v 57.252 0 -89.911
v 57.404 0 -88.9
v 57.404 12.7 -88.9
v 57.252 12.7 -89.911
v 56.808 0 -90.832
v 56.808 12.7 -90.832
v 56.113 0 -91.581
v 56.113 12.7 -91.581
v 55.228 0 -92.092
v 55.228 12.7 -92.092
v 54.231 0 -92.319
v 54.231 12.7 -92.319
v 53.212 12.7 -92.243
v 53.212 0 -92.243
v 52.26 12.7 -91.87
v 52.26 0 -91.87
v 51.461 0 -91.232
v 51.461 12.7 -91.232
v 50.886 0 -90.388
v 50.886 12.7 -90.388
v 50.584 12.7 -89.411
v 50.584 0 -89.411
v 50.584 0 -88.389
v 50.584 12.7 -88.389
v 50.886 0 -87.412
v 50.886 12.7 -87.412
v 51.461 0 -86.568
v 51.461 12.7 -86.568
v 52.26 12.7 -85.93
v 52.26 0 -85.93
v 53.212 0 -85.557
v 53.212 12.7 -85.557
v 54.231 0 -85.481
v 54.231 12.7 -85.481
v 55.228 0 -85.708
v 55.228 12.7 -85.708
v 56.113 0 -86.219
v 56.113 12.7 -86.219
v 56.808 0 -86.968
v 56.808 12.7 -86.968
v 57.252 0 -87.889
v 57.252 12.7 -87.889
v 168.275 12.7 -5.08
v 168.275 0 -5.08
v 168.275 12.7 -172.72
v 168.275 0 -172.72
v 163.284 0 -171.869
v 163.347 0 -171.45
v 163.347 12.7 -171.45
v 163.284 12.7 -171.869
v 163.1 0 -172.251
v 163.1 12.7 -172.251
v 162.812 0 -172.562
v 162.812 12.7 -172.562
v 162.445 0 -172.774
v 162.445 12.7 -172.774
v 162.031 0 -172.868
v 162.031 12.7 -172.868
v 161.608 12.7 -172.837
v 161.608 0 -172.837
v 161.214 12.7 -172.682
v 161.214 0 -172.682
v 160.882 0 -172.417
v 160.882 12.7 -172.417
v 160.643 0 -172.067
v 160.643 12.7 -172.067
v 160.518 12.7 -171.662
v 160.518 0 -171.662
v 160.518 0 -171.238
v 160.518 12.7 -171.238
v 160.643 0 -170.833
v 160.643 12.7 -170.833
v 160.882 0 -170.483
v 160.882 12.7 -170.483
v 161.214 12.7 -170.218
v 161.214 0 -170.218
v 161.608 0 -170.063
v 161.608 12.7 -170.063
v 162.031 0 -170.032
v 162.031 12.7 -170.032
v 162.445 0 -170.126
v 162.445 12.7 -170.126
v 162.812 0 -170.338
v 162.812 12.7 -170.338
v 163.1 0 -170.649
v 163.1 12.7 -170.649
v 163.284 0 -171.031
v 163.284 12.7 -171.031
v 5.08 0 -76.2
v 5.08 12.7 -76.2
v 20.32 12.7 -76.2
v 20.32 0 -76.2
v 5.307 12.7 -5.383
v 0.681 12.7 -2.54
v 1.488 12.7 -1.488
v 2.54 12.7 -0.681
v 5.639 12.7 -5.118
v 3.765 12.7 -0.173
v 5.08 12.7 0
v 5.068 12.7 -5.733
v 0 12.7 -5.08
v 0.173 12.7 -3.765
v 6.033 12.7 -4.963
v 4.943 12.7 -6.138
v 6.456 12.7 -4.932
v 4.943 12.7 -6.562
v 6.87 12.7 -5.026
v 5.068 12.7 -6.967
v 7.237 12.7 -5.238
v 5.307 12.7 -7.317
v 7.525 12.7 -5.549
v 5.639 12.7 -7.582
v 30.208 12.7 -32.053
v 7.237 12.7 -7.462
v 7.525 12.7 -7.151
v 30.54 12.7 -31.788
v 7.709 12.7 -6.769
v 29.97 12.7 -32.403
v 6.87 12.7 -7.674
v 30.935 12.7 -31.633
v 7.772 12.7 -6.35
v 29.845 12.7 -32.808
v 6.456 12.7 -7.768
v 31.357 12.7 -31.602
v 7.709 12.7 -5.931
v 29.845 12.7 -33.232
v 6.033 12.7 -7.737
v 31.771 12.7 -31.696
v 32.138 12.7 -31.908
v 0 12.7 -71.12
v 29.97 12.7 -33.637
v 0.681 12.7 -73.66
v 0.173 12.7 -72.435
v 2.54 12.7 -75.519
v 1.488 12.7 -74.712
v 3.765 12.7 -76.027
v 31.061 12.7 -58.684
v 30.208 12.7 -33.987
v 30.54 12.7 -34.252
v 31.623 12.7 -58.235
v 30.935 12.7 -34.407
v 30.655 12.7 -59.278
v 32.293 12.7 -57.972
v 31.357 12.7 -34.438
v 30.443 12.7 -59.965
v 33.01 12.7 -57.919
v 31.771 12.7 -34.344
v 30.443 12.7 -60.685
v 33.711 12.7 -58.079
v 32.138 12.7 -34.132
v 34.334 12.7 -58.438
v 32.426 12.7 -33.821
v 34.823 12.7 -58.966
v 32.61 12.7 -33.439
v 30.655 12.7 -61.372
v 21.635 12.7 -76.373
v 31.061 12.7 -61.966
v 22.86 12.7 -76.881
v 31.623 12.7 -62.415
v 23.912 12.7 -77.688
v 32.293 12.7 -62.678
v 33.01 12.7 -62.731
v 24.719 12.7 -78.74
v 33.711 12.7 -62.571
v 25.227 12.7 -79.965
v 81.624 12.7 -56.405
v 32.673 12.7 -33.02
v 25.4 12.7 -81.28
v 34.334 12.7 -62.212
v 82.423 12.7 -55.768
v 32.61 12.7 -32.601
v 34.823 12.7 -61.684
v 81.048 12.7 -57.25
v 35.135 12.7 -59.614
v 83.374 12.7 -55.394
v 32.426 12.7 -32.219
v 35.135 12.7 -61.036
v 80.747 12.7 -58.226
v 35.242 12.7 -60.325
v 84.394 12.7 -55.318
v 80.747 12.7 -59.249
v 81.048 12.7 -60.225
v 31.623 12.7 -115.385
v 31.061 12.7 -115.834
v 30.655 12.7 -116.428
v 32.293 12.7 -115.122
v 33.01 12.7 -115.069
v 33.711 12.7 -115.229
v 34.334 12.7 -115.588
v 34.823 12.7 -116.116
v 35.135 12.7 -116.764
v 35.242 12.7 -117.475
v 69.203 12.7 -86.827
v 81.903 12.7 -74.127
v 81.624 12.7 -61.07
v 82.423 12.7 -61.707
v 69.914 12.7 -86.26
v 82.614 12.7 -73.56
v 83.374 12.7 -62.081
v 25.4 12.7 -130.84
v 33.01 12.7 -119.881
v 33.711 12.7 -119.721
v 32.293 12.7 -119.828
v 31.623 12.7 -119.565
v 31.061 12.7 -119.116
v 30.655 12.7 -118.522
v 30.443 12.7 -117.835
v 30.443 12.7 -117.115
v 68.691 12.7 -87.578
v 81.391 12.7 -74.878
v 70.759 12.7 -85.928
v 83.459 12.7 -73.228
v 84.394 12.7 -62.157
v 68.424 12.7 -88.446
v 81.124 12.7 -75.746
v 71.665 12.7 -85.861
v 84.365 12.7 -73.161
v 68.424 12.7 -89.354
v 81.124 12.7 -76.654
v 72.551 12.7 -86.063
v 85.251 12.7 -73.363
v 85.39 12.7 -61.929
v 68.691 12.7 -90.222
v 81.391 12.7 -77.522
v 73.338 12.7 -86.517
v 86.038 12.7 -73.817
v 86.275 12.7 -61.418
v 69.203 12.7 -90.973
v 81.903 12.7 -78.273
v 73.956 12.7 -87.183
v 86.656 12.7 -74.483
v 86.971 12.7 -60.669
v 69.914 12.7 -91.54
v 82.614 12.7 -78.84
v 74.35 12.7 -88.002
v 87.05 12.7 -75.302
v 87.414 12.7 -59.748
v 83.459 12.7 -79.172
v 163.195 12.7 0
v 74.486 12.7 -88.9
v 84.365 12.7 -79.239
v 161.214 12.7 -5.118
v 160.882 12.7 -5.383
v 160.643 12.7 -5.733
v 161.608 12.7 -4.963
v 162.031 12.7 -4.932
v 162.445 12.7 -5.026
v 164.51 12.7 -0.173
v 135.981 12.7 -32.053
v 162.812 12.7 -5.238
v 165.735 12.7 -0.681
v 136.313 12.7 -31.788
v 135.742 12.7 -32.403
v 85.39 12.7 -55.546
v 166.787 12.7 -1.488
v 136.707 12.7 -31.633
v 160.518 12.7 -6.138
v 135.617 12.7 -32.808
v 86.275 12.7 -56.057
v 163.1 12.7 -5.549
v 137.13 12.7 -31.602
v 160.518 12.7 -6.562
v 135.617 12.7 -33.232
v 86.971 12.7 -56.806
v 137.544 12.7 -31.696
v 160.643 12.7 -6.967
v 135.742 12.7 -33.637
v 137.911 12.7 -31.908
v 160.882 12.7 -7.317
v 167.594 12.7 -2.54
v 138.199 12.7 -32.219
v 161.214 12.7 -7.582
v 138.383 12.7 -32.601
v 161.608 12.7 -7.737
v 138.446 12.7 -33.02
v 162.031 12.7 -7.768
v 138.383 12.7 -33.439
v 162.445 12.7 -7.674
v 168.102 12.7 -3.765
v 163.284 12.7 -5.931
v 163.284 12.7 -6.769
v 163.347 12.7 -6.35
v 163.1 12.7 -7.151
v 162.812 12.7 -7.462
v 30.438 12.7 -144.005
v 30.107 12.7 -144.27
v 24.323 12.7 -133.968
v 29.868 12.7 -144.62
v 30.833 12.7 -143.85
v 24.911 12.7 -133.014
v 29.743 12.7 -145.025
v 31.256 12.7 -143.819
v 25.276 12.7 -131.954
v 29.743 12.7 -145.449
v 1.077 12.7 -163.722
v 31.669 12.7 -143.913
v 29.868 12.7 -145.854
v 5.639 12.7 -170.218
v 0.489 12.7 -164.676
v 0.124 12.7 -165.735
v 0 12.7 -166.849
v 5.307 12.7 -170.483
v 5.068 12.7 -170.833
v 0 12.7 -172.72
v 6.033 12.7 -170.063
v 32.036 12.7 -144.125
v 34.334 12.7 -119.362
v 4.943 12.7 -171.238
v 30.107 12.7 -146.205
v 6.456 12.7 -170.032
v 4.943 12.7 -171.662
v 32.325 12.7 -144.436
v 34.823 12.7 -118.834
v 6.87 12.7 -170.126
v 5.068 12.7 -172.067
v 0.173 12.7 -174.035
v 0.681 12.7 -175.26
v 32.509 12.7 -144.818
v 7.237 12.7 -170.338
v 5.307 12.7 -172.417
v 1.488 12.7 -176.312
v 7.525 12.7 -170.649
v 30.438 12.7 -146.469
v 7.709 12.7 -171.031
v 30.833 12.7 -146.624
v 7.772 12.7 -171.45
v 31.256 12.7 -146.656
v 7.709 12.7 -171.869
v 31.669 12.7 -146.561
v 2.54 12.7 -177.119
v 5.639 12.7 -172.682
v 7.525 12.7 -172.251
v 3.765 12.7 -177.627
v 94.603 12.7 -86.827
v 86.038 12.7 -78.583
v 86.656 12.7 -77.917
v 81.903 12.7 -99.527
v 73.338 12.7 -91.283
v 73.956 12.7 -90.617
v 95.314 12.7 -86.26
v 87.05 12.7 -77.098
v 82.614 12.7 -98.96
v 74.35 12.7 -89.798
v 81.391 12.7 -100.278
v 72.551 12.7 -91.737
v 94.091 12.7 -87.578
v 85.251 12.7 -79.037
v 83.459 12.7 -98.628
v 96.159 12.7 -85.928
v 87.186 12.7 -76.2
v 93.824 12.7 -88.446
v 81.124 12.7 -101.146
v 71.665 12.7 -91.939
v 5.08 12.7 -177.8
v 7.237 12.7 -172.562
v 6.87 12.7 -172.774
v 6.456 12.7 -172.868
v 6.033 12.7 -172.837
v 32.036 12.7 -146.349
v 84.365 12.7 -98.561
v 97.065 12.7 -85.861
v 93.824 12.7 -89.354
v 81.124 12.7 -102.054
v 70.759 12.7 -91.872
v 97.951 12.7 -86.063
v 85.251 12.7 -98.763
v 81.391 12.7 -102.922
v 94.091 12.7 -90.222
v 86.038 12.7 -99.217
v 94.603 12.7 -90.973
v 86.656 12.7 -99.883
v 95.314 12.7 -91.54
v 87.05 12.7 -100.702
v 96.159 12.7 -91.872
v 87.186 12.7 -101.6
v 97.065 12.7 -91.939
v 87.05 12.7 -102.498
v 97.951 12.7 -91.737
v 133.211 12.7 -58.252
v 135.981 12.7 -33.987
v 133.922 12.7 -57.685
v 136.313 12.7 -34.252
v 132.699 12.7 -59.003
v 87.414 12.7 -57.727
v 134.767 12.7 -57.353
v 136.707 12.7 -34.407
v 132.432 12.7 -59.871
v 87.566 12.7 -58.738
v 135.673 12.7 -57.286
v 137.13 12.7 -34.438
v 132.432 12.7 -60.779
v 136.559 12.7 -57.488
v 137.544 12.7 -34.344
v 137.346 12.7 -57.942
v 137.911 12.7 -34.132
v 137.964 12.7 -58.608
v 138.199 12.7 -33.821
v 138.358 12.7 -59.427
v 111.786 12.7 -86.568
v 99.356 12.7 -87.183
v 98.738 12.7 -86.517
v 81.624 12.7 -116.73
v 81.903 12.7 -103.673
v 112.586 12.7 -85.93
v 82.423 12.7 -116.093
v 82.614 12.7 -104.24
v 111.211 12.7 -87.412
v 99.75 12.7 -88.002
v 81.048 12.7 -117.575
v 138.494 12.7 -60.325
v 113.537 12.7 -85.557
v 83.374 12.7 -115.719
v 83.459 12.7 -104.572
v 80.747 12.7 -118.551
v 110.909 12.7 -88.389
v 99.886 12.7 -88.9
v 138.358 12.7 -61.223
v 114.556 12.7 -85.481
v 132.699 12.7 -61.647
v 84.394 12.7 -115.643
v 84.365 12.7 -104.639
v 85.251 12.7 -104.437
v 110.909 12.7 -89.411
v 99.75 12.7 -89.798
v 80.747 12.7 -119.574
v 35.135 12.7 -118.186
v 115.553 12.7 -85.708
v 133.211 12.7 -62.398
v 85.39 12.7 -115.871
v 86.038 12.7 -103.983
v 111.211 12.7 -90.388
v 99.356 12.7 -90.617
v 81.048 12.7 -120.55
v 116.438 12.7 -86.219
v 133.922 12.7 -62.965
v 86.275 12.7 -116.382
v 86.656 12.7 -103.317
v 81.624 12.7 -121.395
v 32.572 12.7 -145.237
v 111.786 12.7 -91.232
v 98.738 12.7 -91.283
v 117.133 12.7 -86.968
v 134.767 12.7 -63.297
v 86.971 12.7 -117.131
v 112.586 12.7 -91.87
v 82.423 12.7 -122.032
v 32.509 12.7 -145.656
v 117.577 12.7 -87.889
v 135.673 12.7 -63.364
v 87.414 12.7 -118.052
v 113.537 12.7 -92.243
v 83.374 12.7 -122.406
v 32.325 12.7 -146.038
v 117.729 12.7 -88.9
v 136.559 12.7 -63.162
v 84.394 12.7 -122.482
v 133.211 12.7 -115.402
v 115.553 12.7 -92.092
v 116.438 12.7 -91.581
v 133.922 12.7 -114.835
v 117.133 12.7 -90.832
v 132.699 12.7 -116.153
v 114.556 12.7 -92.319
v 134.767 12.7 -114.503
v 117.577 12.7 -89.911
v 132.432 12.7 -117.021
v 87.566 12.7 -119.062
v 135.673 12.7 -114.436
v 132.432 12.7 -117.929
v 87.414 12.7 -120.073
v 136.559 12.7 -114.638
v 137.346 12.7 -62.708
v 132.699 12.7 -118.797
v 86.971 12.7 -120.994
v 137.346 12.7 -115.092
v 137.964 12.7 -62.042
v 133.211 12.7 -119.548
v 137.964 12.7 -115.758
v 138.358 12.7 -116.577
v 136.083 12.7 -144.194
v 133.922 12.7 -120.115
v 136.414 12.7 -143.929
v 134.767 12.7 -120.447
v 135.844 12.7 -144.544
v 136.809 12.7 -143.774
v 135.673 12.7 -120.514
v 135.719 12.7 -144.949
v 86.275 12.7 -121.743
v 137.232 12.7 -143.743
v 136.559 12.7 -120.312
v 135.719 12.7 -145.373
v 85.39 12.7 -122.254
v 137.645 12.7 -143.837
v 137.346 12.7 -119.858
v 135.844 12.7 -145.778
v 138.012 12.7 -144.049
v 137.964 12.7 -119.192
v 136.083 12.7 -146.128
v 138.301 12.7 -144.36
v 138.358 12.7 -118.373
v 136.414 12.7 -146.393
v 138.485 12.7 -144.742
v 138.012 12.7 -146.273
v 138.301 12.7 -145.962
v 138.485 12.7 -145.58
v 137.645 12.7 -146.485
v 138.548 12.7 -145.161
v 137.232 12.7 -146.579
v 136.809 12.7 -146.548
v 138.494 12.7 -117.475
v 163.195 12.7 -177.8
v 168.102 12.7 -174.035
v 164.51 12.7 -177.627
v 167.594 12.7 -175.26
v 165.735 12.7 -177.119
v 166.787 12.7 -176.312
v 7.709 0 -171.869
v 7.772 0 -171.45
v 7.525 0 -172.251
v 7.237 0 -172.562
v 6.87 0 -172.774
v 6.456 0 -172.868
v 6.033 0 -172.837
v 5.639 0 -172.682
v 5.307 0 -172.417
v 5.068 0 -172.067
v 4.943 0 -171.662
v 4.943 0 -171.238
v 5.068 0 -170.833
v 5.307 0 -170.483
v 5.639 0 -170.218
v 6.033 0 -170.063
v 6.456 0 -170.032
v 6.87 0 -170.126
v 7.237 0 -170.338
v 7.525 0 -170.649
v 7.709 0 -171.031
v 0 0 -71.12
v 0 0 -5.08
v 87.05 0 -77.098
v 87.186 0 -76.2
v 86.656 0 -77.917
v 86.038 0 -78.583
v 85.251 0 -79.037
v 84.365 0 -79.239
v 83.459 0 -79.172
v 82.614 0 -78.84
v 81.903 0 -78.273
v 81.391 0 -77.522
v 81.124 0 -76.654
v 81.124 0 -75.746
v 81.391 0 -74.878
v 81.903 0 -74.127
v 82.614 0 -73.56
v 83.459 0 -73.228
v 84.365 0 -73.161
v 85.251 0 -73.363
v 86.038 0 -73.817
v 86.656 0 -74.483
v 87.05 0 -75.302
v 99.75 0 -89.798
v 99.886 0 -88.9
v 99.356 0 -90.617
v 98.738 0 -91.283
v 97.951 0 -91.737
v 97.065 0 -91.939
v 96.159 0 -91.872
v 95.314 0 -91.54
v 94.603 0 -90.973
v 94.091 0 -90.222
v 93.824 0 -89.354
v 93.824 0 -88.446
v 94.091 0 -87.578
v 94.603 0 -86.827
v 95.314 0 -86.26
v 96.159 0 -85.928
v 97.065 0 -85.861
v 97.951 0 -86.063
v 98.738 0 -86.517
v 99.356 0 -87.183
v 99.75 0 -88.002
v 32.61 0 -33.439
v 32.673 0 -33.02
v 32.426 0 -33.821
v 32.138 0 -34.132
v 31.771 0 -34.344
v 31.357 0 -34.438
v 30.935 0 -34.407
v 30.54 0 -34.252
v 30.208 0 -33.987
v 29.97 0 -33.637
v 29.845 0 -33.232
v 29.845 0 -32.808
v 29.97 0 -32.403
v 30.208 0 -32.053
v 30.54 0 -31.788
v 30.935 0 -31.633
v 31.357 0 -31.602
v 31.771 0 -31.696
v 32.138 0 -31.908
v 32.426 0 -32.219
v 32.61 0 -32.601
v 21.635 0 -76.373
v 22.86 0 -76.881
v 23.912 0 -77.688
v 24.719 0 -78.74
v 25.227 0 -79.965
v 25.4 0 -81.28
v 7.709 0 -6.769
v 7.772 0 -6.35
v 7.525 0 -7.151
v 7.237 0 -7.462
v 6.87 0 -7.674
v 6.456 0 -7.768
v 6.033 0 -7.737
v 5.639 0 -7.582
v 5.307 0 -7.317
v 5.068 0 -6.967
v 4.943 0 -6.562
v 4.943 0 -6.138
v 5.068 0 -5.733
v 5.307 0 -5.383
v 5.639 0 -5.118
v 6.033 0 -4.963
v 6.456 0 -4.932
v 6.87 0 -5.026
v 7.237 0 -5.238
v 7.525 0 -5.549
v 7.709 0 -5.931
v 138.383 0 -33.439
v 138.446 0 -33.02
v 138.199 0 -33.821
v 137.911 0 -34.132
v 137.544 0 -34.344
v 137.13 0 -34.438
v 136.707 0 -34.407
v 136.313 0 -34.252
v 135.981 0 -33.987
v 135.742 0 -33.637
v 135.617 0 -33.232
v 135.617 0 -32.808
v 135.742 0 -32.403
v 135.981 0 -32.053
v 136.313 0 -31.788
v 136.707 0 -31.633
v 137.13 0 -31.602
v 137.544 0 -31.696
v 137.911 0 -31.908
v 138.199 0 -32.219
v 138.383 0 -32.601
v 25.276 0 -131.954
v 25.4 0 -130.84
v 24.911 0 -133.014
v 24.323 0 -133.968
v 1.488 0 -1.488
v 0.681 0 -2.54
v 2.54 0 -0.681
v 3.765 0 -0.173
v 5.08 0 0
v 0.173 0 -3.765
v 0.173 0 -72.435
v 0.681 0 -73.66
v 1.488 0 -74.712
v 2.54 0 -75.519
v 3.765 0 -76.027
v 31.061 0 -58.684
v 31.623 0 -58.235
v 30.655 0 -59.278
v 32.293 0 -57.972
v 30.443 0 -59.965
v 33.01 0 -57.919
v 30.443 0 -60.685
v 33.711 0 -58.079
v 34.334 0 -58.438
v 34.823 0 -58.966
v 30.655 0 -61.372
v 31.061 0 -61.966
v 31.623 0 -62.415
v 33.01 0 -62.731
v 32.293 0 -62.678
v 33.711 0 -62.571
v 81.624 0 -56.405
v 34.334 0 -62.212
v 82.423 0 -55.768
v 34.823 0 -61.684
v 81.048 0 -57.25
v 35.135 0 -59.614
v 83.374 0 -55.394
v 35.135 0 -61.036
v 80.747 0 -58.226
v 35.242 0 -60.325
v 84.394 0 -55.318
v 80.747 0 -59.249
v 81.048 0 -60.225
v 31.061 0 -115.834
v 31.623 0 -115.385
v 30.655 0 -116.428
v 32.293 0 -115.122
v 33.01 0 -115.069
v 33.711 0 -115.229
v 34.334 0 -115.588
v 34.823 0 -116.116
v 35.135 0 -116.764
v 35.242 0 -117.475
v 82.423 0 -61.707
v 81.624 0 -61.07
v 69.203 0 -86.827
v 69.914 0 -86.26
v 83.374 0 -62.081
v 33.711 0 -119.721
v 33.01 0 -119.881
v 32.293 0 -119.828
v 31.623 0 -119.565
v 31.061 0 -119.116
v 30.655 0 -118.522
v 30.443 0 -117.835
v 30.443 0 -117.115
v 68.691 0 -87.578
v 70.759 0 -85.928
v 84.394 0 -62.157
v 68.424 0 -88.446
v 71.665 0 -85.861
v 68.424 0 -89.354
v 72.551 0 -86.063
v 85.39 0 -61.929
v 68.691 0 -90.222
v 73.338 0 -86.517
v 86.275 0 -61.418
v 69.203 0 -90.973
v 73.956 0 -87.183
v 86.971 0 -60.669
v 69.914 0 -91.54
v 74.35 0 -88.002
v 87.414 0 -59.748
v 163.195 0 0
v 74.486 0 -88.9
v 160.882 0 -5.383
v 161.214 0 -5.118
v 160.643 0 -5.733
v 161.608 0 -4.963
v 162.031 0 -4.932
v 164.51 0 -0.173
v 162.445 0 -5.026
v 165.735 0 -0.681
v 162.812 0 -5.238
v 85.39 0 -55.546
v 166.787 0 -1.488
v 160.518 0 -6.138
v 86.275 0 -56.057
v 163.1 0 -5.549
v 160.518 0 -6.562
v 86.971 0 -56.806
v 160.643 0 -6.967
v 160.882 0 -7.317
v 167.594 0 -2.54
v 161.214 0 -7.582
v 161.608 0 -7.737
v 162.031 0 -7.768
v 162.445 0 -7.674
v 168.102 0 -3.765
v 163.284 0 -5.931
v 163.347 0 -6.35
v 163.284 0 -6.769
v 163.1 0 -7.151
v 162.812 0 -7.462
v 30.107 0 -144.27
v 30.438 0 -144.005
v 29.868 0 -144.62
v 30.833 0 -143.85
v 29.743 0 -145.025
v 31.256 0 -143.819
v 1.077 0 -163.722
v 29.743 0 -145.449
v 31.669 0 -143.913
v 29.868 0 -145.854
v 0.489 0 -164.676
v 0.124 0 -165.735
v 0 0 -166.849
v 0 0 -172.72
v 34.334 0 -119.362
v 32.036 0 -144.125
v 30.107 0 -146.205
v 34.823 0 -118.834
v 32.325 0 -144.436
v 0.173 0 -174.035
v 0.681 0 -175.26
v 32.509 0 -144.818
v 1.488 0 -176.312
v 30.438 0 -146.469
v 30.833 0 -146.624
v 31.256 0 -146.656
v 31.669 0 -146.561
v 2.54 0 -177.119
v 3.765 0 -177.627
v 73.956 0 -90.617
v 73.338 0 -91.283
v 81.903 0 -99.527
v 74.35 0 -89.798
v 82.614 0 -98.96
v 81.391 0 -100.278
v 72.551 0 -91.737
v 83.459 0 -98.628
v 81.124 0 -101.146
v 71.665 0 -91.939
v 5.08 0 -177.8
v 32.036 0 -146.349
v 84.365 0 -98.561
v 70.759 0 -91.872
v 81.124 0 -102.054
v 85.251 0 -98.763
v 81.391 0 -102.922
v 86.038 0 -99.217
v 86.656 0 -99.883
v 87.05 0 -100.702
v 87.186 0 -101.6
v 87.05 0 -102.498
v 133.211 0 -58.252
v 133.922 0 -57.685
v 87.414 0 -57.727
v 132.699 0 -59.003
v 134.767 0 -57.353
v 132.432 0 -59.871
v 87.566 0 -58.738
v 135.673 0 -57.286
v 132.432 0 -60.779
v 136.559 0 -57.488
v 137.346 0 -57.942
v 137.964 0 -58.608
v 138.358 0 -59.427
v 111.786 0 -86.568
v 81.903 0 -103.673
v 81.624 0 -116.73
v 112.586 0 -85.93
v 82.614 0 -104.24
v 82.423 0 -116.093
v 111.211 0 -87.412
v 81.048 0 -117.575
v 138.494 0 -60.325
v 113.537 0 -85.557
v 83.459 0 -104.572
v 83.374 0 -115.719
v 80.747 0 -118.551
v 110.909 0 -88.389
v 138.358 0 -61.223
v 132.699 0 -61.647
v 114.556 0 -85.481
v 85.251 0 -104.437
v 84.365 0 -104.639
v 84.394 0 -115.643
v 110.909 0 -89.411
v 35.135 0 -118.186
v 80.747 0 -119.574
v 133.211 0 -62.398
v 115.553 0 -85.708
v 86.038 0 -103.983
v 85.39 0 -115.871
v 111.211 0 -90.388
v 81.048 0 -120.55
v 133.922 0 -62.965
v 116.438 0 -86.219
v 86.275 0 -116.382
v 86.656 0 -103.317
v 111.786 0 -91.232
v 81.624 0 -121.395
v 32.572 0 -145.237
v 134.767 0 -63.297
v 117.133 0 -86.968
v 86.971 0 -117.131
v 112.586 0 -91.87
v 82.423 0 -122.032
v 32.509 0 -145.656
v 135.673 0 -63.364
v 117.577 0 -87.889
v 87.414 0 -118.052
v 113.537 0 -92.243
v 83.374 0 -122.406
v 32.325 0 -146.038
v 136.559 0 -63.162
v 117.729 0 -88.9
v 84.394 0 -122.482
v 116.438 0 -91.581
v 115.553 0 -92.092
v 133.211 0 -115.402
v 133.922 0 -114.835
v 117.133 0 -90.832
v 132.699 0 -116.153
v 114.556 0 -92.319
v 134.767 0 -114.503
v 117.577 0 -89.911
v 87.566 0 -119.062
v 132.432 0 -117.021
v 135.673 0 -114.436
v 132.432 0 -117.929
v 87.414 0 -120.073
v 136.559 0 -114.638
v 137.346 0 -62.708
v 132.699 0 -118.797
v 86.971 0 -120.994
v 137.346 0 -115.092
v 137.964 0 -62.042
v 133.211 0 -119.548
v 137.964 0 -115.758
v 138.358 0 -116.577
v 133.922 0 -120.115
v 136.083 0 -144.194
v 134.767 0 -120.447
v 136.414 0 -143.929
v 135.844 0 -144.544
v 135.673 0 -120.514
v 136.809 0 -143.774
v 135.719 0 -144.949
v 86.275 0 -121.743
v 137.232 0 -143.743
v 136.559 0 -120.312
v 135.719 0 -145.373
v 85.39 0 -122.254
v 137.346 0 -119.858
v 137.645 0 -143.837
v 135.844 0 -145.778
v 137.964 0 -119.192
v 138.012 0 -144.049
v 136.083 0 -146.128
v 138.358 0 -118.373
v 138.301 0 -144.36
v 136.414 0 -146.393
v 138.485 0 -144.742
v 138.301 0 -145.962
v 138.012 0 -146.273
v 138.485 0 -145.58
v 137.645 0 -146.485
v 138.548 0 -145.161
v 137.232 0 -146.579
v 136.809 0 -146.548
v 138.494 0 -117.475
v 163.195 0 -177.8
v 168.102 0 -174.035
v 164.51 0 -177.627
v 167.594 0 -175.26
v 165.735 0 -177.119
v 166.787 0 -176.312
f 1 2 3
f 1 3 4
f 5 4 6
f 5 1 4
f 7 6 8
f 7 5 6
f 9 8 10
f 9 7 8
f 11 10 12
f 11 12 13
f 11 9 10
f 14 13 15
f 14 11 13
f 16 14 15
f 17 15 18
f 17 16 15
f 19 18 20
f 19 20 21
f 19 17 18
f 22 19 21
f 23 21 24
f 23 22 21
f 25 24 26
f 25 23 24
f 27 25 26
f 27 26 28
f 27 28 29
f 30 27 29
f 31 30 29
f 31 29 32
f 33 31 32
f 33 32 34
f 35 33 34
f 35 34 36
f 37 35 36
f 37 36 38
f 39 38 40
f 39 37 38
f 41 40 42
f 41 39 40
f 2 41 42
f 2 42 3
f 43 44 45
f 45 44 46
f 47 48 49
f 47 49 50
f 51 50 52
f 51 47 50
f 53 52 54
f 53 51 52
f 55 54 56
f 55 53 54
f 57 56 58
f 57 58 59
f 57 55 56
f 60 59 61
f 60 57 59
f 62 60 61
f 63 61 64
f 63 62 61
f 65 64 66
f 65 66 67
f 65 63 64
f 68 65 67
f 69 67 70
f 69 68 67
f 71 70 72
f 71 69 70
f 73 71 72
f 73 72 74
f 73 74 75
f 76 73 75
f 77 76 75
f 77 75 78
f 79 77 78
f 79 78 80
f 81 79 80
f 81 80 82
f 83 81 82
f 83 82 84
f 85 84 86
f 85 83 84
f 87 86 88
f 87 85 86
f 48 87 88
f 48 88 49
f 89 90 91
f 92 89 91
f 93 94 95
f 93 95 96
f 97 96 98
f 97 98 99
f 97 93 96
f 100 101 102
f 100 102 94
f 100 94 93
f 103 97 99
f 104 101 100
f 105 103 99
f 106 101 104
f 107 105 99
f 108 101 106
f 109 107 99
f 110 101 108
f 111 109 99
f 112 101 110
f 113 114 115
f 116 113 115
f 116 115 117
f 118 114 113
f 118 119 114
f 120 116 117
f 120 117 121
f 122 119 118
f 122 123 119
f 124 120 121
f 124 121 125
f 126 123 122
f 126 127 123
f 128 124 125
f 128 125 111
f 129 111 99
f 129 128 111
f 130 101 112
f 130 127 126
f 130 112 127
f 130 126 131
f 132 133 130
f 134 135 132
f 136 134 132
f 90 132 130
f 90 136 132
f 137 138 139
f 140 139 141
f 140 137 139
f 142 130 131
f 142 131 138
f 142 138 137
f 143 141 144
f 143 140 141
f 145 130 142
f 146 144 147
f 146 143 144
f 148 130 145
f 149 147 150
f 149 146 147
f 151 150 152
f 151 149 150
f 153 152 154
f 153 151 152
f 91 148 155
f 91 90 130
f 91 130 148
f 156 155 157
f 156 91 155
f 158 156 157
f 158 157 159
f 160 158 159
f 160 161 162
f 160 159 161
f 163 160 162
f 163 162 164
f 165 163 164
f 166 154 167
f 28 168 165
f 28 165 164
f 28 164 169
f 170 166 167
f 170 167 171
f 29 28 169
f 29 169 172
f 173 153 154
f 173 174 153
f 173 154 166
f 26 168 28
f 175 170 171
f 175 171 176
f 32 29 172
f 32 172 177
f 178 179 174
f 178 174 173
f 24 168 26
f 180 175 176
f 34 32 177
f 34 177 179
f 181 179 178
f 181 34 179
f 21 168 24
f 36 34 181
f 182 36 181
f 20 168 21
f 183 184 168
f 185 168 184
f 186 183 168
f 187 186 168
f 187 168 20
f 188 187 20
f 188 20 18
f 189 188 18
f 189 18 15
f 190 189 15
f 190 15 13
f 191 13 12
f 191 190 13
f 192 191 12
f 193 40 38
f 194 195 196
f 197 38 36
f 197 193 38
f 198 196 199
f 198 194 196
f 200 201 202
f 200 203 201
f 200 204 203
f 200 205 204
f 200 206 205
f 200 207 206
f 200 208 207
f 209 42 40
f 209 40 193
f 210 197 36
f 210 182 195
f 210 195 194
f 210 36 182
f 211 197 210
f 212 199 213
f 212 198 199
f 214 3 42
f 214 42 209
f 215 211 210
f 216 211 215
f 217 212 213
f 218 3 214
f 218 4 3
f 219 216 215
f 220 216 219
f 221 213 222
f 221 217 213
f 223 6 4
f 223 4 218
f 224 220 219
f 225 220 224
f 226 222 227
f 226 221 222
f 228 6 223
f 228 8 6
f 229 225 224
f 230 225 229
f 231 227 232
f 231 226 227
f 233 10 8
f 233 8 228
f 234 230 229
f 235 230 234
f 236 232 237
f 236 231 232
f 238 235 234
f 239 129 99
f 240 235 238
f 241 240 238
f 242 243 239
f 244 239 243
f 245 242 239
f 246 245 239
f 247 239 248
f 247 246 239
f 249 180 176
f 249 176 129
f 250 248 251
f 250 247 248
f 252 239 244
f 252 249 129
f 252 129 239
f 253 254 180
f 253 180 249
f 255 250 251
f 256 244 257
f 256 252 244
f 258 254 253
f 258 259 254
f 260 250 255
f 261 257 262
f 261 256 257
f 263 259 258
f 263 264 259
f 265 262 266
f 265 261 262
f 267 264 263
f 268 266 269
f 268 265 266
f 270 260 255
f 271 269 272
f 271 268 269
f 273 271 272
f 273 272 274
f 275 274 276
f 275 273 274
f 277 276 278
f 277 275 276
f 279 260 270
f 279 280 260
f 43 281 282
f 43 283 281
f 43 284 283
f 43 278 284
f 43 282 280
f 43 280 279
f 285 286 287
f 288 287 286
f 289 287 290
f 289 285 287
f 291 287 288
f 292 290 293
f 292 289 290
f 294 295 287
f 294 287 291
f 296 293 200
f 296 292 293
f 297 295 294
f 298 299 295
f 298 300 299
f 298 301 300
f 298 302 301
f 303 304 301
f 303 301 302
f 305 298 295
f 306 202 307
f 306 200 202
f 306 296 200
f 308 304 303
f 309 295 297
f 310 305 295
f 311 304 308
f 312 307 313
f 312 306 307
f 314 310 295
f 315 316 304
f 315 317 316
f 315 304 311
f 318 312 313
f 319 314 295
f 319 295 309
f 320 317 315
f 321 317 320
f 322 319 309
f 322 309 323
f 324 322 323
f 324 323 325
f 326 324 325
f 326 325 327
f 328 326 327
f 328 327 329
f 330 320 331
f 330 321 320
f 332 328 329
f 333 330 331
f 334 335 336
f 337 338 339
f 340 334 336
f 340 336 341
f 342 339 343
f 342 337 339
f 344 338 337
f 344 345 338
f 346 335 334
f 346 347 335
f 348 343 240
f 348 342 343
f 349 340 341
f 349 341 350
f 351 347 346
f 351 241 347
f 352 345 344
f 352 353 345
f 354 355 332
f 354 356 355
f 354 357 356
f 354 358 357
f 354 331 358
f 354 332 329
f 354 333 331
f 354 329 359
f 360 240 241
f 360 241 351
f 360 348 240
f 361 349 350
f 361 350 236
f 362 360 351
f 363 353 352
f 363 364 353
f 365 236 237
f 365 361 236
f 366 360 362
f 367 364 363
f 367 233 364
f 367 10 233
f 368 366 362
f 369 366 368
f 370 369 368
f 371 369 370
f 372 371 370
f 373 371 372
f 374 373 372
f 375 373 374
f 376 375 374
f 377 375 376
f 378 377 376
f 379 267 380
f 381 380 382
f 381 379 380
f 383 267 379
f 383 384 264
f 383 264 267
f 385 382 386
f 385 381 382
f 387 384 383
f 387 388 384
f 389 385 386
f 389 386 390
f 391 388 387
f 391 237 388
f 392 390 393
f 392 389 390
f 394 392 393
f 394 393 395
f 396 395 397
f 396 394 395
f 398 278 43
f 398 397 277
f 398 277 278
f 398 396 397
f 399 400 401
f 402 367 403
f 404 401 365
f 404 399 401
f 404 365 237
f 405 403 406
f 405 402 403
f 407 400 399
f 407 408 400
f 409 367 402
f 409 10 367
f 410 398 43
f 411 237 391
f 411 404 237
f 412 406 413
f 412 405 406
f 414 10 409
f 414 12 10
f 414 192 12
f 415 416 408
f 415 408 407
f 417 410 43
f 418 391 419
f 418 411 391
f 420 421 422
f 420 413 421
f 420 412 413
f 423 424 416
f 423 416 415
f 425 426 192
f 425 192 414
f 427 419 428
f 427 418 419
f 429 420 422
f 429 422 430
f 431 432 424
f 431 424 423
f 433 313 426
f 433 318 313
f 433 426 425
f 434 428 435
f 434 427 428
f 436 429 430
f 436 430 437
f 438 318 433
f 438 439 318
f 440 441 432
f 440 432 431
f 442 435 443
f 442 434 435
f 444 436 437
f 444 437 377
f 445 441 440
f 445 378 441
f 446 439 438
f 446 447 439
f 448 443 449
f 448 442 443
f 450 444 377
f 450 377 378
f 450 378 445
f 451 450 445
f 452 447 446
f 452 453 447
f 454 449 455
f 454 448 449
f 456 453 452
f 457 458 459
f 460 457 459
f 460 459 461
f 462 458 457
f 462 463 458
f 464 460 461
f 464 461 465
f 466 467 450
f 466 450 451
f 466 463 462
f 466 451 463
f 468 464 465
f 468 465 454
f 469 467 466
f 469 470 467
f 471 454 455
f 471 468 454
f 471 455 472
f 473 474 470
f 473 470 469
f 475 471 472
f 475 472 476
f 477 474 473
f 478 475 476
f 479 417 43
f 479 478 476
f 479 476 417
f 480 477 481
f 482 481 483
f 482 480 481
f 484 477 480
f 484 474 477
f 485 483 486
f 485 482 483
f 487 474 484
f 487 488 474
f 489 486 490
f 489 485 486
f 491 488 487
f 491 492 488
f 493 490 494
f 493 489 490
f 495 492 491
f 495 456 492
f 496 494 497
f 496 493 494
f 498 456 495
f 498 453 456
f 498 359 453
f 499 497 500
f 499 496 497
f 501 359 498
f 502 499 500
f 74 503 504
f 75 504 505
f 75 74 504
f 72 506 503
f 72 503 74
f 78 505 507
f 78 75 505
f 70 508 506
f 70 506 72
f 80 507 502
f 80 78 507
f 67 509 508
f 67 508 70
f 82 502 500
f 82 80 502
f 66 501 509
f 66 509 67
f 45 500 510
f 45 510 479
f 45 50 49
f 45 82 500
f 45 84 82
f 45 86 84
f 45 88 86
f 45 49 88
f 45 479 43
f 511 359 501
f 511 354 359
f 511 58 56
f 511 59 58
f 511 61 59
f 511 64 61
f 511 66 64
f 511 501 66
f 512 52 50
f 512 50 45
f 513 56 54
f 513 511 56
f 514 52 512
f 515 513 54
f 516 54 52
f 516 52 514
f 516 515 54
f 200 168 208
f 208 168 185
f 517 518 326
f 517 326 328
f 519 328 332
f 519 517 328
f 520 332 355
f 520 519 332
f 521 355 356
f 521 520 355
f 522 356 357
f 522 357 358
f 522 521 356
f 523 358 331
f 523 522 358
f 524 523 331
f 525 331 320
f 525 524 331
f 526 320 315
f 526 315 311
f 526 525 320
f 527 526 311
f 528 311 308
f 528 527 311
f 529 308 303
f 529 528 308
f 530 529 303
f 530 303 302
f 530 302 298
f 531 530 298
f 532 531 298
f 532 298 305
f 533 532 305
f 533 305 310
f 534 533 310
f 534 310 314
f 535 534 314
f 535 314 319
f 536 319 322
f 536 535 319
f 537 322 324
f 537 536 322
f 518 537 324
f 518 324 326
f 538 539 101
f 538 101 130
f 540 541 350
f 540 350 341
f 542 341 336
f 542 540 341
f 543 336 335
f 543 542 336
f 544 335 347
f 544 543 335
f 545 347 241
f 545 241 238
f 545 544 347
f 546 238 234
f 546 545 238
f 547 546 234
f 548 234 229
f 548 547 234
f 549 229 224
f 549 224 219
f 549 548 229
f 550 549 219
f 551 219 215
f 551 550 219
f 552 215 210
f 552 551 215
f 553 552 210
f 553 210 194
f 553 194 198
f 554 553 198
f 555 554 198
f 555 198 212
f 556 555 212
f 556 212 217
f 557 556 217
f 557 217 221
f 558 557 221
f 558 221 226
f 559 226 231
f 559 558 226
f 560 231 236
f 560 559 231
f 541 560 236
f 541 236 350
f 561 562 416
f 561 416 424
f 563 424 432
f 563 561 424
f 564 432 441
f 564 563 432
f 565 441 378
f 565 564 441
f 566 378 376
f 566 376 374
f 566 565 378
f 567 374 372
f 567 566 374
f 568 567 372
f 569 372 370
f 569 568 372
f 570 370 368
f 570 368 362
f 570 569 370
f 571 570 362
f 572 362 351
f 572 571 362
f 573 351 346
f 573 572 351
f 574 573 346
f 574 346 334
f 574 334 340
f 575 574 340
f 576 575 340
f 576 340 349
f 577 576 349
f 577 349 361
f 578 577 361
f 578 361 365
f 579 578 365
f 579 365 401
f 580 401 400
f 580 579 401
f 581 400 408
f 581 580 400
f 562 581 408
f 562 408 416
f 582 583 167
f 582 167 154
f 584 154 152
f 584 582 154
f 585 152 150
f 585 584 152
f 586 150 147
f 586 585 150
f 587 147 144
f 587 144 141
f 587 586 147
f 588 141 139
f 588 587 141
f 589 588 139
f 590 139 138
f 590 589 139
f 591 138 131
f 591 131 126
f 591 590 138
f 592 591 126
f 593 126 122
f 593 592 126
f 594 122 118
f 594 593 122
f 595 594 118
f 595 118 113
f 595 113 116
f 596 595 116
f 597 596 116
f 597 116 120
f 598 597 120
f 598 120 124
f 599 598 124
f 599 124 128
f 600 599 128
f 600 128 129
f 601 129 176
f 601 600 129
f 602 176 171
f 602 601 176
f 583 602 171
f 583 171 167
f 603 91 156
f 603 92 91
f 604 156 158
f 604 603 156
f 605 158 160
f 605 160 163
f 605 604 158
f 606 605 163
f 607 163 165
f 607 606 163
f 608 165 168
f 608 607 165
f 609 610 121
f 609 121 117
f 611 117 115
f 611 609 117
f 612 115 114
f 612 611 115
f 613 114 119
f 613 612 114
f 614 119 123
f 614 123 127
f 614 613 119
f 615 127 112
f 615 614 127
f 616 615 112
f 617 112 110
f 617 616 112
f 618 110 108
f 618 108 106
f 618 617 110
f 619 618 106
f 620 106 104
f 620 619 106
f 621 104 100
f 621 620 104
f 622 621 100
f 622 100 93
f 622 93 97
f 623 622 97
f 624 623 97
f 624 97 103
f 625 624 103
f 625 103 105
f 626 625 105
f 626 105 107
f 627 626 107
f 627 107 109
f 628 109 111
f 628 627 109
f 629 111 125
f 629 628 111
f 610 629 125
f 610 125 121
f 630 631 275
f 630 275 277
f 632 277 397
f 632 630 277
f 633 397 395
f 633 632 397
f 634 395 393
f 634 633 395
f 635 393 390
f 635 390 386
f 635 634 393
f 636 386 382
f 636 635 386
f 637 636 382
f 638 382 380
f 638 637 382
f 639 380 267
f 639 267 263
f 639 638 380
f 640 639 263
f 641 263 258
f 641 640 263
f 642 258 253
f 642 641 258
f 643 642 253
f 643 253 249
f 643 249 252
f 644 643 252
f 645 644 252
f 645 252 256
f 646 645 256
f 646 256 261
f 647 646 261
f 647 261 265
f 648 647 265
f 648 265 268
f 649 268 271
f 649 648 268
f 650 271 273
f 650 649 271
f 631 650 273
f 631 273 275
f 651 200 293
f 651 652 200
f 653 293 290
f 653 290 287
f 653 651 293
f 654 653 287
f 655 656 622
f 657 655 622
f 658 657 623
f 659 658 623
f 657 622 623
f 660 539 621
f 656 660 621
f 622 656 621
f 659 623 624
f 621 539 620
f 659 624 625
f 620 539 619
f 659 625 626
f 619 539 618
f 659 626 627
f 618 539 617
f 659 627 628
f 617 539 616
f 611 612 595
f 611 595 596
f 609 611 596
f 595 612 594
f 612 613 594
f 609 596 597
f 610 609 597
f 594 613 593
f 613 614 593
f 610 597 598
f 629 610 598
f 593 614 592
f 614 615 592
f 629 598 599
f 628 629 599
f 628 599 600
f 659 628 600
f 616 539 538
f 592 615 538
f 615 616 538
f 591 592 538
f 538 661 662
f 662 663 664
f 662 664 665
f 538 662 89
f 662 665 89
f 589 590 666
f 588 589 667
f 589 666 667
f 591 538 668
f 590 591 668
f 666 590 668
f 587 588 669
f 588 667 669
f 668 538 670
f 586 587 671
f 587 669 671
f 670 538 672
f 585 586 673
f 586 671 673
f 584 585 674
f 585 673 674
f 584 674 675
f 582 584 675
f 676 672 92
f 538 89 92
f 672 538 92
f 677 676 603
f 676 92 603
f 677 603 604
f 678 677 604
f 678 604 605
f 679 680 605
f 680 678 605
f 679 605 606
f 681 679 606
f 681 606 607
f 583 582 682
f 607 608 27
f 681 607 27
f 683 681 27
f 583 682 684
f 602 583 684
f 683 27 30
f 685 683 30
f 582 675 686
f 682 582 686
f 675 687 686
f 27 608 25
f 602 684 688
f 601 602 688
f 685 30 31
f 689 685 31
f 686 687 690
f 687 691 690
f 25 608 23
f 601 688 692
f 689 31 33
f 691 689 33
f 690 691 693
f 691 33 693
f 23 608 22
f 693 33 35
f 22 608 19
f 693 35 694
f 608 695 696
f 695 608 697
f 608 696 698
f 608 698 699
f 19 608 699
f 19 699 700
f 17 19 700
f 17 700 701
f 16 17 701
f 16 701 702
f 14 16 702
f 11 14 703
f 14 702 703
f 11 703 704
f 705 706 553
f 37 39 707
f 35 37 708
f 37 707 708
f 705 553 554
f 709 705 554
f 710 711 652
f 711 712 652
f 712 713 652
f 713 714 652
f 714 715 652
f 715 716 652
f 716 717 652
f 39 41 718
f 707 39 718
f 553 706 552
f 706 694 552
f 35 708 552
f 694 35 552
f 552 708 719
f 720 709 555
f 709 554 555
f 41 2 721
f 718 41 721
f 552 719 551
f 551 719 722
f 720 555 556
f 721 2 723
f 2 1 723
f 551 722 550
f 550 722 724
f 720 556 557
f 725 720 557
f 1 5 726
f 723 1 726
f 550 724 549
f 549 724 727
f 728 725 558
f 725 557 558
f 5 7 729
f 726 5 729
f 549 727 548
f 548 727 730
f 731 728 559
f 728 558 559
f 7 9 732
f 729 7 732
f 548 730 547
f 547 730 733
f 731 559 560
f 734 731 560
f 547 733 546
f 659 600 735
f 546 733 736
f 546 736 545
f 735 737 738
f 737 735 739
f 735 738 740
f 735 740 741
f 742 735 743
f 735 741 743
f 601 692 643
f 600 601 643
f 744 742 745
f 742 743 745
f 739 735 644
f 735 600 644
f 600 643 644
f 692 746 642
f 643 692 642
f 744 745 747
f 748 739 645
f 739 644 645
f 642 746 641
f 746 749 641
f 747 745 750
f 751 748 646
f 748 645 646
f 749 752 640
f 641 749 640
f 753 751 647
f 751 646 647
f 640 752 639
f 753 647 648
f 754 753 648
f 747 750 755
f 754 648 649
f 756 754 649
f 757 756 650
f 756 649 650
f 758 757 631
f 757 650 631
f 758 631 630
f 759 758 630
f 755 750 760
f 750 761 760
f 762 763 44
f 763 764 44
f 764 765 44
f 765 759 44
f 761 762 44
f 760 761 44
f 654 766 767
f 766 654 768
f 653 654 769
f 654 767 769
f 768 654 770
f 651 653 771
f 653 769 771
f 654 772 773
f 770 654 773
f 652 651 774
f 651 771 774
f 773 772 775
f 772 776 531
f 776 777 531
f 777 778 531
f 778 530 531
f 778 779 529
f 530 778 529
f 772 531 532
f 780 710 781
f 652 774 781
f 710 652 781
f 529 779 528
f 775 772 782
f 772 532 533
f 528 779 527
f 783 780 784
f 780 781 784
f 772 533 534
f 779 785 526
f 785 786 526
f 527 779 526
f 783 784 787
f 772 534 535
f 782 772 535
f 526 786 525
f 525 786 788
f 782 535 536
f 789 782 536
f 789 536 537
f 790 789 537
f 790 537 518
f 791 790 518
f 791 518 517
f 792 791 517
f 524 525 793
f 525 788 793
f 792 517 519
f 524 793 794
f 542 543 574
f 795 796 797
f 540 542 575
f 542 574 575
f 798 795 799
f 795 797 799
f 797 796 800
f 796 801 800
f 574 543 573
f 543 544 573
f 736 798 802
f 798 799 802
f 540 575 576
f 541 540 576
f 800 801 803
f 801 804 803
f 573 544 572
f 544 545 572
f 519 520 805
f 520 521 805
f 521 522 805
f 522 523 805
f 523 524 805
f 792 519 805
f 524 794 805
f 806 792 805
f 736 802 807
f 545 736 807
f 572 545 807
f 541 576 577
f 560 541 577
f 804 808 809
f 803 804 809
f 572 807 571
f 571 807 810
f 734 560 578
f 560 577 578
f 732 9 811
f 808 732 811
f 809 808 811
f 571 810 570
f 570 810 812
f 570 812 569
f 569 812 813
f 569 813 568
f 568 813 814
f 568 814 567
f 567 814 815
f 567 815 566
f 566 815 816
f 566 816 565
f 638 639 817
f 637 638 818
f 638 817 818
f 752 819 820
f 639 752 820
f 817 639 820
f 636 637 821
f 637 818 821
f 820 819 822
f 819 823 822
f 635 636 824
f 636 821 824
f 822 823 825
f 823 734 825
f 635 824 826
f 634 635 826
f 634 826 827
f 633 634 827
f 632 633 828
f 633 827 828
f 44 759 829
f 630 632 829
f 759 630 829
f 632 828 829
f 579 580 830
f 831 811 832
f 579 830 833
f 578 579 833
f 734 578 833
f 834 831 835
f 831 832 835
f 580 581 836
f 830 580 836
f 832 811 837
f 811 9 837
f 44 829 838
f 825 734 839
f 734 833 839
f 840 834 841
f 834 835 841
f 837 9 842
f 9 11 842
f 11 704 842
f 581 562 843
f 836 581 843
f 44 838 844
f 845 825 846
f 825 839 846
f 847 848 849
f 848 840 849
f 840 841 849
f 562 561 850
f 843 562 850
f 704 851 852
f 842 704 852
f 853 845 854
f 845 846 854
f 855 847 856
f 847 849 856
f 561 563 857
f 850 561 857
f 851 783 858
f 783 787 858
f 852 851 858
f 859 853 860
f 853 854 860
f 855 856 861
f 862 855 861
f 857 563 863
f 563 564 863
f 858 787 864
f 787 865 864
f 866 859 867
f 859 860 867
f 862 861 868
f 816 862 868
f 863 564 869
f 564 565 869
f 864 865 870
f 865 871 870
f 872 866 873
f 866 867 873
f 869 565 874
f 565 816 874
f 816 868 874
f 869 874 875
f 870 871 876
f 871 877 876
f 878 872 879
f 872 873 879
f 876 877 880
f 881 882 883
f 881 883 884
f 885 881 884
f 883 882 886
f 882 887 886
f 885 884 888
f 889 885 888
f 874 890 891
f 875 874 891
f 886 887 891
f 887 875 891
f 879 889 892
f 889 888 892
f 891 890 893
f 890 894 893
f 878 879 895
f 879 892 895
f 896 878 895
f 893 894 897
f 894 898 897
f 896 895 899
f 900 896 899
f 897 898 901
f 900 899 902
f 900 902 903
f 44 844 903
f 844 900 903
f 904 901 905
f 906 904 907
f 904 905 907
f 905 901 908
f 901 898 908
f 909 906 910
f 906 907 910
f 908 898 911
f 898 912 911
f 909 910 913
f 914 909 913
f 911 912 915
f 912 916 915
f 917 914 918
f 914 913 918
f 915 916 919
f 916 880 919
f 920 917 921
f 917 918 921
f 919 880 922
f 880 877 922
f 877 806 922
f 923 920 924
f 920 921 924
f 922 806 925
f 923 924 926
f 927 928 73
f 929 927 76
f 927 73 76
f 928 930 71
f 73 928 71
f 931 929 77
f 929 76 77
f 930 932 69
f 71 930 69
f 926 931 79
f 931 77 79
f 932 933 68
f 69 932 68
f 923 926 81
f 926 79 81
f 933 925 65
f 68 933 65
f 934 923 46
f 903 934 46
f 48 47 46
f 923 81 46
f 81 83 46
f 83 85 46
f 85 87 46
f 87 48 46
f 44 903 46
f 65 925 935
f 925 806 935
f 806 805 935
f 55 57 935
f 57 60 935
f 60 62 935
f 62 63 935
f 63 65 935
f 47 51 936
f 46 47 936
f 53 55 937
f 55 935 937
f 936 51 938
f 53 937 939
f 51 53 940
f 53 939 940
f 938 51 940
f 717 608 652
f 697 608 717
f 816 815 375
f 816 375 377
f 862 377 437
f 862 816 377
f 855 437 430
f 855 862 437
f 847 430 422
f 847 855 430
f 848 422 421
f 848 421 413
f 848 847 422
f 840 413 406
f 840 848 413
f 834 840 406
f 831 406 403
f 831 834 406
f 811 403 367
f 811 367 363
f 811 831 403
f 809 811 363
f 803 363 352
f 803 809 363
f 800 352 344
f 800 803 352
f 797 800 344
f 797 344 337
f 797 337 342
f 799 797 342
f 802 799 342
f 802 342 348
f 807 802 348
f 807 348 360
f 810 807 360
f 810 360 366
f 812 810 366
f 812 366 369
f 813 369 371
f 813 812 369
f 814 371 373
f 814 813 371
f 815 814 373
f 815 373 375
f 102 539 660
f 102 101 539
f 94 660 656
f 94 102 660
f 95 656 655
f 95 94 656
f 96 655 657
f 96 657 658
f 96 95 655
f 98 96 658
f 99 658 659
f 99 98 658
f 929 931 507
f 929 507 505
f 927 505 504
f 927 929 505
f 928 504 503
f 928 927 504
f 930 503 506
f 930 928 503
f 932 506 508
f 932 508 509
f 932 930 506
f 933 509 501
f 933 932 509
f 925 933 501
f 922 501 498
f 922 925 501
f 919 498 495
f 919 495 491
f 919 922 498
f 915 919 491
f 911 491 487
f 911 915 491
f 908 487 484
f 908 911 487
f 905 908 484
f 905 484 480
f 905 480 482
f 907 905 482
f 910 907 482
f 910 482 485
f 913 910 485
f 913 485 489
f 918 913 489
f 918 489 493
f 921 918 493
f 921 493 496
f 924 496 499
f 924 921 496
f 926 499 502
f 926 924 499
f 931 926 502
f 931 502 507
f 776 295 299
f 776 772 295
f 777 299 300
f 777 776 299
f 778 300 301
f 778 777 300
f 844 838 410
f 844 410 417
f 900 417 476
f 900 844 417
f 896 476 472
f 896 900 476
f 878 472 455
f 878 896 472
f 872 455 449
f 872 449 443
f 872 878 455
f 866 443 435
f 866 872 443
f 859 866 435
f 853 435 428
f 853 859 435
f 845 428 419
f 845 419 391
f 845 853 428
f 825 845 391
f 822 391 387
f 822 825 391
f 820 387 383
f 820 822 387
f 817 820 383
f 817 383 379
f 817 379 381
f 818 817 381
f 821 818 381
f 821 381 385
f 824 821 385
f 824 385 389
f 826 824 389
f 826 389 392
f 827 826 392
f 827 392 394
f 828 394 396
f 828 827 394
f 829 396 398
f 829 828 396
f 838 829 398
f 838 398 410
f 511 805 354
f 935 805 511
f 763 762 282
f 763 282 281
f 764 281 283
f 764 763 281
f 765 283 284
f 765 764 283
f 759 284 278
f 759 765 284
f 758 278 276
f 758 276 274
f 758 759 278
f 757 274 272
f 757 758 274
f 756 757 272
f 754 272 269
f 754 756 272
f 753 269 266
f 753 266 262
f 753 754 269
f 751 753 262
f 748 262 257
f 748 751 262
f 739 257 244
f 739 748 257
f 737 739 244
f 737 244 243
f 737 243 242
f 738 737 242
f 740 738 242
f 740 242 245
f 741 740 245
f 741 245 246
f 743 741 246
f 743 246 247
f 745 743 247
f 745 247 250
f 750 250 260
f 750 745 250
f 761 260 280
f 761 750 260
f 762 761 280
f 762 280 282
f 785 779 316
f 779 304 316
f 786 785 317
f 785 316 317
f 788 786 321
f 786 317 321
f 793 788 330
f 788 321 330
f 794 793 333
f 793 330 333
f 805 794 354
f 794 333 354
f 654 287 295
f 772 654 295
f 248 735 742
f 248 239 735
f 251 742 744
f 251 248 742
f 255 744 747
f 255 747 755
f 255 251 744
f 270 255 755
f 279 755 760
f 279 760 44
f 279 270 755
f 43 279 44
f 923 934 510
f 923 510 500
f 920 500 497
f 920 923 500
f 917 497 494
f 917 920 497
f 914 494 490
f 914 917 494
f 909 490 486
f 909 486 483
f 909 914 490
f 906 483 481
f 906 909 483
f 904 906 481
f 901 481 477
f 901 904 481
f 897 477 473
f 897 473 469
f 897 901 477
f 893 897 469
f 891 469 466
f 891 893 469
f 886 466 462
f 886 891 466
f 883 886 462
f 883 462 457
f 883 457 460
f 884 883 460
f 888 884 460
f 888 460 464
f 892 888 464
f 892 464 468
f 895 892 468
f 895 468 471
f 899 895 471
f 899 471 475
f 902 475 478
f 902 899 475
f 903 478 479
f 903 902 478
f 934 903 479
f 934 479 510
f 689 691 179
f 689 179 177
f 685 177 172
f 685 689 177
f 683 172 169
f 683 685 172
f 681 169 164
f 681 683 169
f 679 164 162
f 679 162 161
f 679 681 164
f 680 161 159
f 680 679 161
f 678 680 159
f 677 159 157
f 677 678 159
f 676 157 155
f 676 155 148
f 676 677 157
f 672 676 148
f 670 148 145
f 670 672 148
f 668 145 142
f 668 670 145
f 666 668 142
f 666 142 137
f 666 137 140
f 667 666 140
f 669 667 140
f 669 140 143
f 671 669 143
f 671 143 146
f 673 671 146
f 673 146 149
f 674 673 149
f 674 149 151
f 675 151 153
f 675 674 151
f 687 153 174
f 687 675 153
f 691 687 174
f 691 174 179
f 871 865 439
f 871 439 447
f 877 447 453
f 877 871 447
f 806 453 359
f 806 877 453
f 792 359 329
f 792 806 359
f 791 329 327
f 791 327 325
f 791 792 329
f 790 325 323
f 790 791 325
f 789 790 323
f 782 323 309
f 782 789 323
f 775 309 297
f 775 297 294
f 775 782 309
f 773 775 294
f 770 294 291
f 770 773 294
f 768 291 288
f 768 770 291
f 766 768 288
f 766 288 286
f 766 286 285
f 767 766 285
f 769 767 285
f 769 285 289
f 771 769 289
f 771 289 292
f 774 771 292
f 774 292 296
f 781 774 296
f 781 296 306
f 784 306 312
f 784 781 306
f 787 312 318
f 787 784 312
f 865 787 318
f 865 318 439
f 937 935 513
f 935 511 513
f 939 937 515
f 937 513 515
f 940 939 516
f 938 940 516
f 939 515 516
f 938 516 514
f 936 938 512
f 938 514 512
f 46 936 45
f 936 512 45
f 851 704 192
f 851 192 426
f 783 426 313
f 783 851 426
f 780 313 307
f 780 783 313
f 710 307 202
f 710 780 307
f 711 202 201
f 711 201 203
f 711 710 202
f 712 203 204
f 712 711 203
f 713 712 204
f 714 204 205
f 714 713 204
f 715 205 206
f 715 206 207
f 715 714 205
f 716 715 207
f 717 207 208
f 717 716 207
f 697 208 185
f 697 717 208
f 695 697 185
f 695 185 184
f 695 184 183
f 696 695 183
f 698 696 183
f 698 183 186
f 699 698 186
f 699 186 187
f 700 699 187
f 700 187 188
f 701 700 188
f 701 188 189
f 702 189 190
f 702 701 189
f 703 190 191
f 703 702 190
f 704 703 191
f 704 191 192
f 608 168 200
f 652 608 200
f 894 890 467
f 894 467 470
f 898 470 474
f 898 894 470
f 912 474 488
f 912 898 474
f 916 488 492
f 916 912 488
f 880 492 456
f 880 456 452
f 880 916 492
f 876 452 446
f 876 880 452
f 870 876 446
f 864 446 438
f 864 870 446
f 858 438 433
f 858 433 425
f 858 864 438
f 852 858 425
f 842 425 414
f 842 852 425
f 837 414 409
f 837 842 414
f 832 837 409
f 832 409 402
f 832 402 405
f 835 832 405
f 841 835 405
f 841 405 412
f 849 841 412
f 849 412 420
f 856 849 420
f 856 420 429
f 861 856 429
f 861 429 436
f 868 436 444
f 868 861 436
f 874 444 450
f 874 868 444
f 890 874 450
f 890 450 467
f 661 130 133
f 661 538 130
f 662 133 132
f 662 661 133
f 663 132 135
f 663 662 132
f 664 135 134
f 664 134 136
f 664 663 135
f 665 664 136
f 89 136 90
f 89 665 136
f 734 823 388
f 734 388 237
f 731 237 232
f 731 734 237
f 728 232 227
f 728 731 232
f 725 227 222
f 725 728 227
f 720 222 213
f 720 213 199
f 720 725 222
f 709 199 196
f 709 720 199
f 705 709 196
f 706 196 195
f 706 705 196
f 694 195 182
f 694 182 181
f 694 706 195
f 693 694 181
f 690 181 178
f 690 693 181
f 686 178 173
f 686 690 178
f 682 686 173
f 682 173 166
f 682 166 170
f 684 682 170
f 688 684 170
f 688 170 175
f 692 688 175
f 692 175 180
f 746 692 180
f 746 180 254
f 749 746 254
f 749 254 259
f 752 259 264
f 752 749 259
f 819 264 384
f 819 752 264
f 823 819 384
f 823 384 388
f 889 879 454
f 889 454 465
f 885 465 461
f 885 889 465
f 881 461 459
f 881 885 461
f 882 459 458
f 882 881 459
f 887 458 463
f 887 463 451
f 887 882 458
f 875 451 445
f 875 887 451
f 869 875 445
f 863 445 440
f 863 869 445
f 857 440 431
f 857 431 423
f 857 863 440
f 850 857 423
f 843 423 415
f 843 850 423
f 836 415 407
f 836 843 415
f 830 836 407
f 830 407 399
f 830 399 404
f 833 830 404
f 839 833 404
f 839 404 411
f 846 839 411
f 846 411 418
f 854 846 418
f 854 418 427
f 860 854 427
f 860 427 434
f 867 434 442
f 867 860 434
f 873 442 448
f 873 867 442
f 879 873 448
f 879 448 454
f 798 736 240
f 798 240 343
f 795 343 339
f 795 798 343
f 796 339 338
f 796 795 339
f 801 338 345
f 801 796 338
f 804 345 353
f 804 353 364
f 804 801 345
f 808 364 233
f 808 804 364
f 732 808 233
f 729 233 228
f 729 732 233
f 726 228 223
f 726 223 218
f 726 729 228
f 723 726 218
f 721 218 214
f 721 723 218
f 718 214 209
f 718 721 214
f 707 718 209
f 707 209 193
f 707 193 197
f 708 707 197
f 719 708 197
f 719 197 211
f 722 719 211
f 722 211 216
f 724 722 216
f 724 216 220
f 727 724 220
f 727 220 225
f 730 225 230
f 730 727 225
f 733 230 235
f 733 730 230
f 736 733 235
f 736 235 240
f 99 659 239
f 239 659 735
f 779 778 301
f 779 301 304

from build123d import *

# Parameters (mm, degrees)
SKETCH2_W               = 168.275
SKETCH2_H               = 177.8
SKETCH2_R               = 3.048
SKETCH2_R_2             = 2.413
SKETCH2_R_3             = 1.4224
SKETCH2_R_4             = 3.429
BOSS_EXTRUDE2_DEPTH     = 12.7
CUT_EXTRUDE1_DEPTH      = 1
CUT_EXTRUDE1_DEPTH_BACK = 13.7
FILLET1_R               = 5.08


with BuildPart() as part:
    # Sketch2 → Boss-Extrude2 (new body)
    with BuildSketch(Plane(origin=(0, 0, 0), x_dir=(1, 0, 0), z_dir=(0, 1, 0))):
        with Locations((84.1375, 88.9)):
            Rectangle(SKETCH2_W, SKETCH2_H)
        with Locations((84.1375, 101.6)):
            Circle(SKETCH2_R, mode=Mode.SUBTRACT)
        with Locations((96.8375, 88.9)):
            Circle(SKETCH2_R, mode=Mode.SUBTRACT)
        with Locations((84.1375, 76.2)):
            Circle(SKETCH2_R, mode=Mode.SUBTRACT)
        with Locations((71.4375, 88.9)):
            Circle(SKETCH2_R, mode=Mode.SUBTRACT)
        with Locations((32.8295, 117.475)):
            Circle(SKETCH2_R_2, mode=Mode.SUBTRACT)
        with Locations((135.4455, 117.475)):
            Circle(SKETCH2_R, mode=Mode.SUBTRACT)
        with Locations((135.4455, 60.325)):
            Circle(SKETCH2_R, mode=Mode.SUBTRACT)
        with Locations((32.8295, 60.325)):
            Circle(SKETCH2_R_2, mode=Mode.SUBTRACT)
        with Locations((6.35, 171.45)):
            Circle(SKETCH2_R_3, mode=Mode.SUBTRACT)
        with Locations((161.925, 171.45)):
            Circle(SKETCH2_R_3, mode=Mode.SUBTRACT)
        with Locations((161.925, 6.35)):
            Circle(SKETCH2_R_3, mode=Mode.SUBTRACT)
        with Locations((6.35, 6.35)):
            Circle(SKETCH2_R_3, mode=Mode.SUBTRACT)
        with Locations((31.251071429, 33.02)):
            Circle(SKETCH2_R_3, mode=Mode.SUBTRACT)
        with Locations((137.023928571, 33.02)):
            Circle(SKETCH2_R_3, mode=Mode.SUBTRACT)
        with Locations((84.1375, 119.0625)):
            Circle(SKETCH2_R_4, mode=Mode.SUBTRACT)
        with Locations((114.3, 88.9)):
            Circle(SKETCH2_R_4, mode=Mode.SUBTRACT)
        with Locations((84.1375, 58.7375)):
            Circle(SKETCH2_R_4, mode=Mode.SUBTRACT)
        with Locations((53.975, 88.9)):
            Circle(SKETCH2_R_4, mode=Mode.SUBTRACT)
        with Locations((31.149471429, 145.2372)):
            Circle(SKETCH2_R_3, mode=Mode.SUBTRACT)
        with Locations((137.125528571, 145.161)):
            Circle(SKETCH2_R_3, mode=Mode.SUBTRACT)
    extrude(amount=BOSS_EXTRUDE2_DEPTH)

    # Sketch3 → Cut-Extrude1 (cut, two sides)
    with BuildSketch(Plane(origin=(0, 12.7, 0), x_dir=(1, 0, 0), z_dir=(0, 1, 0))) as cut_extrude1_sk:
        Polygon((0, 165.1), (0, 76.2), (25.4, 76.2), (25.4, 132.589482542), align=None)
    extrude(amount=CUT_EXTRUDE1_DEPTH, mode=Mode.SUBTRACT)
    extrude(cut_extrude1_sk.sketch, amount=-CUT_EXTRUDE1_DEPTH_BACK, mode=Mode.SUBTRACT)

    # Fillet1
    fillet1_edges = [part.edges().sort_by_distance(p)[0] for p in [
        (0, 6.35, -165.1),
        (25.4, 6.35, -132.589482542),
        (25.4, 6.35, -76.2),
        (0, 6.35, -76.2),
        (0, 6.35, -177.8),
        (168.275, 6.35, -177.8),
        (168.275, 6.35, 0),
        (0, 6.35, 0),
    ]]
    fillet(fillet1_edges, radius=FILLET1_R)


solid = part.part
